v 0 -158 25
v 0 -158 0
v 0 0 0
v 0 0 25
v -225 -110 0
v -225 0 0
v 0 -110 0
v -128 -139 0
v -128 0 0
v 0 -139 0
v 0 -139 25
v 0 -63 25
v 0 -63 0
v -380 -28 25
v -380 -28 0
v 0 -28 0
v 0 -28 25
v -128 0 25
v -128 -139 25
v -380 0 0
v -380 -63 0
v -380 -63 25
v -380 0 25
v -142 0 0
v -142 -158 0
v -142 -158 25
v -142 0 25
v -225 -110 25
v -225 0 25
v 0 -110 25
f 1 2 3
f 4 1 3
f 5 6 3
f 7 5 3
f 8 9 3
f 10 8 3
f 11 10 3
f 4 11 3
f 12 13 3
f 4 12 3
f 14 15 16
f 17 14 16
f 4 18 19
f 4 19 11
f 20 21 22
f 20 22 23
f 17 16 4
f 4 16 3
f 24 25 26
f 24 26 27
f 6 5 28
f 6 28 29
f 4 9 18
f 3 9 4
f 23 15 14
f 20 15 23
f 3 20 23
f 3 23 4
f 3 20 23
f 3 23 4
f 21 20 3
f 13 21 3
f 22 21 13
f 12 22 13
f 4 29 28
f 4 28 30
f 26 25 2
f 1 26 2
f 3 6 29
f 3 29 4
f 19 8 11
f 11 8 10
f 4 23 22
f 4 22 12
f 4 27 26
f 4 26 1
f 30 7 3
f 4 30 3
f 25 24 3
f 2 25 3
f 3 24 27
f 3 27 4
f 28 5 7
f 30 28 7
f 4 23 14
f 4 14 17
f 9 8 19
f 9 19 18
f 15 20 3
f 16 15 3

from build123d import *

# Parameters (mm, degrees)
F0_W     = 225
F0_H     = 110
F1_DEPTH = 25
F2_W     = 142
F2_H     = 158
F3_DEPTH = 25
F4_W     = 128
F4_H     = 139
F5_DEPTH = 25
F6_W     = 380
F6_H     = 63
F7_DEPTH = 25
F8_W     = 380
F8_H     = 28
F9_DEPTH = 25


with BuildPart() as f1:
    # F0 (on Top) → F1 (new body)
    with BuildSketch(Plane.XY):
        with Locations((-112.5, -55)):
            Rectangle(F0_W, F0_H)
    extrude(amount=F1_DEPTH)


with BuildPart() as f3:
    # F2 (on Top) → F3 (new body)
    with BuildSketch(Plane.XY):
        with Locations((-71, -79)):
            Rectangle(F2_W, F2_H)
    extrude(amount=F3_DEPTH)


with BuildPart() as f5:
    # F4 (on Top) → F5 (new body)
    with BuildSketch(Plane.XY):
        with Locations((-64, -69.5)):
            Rectangle(F4_W, F4_H)
    extrude(amount=F5_DEPTH)


with BuildPart() as f7:
    # F6 (on Top) → F7 (new body)
    with BuildSketch(Plane.XY):
        with Locations((-190, -31.5)):
            Rectangle(F6_W, F6_H)
    extrude(amount=F7_DEPTH)


with BuildPart() as f9:
    # F8 (on Top) → F9 (new body)
    with BuildSketch(Plane.XY):
        with Locations((-190, -14)):
            Rectangle(F8_W, F8_H)
    extrude(amount=F9_DEPTH)


solid = Compound([f1.part, f3.part, f5.part, f7.part, f9.part])
